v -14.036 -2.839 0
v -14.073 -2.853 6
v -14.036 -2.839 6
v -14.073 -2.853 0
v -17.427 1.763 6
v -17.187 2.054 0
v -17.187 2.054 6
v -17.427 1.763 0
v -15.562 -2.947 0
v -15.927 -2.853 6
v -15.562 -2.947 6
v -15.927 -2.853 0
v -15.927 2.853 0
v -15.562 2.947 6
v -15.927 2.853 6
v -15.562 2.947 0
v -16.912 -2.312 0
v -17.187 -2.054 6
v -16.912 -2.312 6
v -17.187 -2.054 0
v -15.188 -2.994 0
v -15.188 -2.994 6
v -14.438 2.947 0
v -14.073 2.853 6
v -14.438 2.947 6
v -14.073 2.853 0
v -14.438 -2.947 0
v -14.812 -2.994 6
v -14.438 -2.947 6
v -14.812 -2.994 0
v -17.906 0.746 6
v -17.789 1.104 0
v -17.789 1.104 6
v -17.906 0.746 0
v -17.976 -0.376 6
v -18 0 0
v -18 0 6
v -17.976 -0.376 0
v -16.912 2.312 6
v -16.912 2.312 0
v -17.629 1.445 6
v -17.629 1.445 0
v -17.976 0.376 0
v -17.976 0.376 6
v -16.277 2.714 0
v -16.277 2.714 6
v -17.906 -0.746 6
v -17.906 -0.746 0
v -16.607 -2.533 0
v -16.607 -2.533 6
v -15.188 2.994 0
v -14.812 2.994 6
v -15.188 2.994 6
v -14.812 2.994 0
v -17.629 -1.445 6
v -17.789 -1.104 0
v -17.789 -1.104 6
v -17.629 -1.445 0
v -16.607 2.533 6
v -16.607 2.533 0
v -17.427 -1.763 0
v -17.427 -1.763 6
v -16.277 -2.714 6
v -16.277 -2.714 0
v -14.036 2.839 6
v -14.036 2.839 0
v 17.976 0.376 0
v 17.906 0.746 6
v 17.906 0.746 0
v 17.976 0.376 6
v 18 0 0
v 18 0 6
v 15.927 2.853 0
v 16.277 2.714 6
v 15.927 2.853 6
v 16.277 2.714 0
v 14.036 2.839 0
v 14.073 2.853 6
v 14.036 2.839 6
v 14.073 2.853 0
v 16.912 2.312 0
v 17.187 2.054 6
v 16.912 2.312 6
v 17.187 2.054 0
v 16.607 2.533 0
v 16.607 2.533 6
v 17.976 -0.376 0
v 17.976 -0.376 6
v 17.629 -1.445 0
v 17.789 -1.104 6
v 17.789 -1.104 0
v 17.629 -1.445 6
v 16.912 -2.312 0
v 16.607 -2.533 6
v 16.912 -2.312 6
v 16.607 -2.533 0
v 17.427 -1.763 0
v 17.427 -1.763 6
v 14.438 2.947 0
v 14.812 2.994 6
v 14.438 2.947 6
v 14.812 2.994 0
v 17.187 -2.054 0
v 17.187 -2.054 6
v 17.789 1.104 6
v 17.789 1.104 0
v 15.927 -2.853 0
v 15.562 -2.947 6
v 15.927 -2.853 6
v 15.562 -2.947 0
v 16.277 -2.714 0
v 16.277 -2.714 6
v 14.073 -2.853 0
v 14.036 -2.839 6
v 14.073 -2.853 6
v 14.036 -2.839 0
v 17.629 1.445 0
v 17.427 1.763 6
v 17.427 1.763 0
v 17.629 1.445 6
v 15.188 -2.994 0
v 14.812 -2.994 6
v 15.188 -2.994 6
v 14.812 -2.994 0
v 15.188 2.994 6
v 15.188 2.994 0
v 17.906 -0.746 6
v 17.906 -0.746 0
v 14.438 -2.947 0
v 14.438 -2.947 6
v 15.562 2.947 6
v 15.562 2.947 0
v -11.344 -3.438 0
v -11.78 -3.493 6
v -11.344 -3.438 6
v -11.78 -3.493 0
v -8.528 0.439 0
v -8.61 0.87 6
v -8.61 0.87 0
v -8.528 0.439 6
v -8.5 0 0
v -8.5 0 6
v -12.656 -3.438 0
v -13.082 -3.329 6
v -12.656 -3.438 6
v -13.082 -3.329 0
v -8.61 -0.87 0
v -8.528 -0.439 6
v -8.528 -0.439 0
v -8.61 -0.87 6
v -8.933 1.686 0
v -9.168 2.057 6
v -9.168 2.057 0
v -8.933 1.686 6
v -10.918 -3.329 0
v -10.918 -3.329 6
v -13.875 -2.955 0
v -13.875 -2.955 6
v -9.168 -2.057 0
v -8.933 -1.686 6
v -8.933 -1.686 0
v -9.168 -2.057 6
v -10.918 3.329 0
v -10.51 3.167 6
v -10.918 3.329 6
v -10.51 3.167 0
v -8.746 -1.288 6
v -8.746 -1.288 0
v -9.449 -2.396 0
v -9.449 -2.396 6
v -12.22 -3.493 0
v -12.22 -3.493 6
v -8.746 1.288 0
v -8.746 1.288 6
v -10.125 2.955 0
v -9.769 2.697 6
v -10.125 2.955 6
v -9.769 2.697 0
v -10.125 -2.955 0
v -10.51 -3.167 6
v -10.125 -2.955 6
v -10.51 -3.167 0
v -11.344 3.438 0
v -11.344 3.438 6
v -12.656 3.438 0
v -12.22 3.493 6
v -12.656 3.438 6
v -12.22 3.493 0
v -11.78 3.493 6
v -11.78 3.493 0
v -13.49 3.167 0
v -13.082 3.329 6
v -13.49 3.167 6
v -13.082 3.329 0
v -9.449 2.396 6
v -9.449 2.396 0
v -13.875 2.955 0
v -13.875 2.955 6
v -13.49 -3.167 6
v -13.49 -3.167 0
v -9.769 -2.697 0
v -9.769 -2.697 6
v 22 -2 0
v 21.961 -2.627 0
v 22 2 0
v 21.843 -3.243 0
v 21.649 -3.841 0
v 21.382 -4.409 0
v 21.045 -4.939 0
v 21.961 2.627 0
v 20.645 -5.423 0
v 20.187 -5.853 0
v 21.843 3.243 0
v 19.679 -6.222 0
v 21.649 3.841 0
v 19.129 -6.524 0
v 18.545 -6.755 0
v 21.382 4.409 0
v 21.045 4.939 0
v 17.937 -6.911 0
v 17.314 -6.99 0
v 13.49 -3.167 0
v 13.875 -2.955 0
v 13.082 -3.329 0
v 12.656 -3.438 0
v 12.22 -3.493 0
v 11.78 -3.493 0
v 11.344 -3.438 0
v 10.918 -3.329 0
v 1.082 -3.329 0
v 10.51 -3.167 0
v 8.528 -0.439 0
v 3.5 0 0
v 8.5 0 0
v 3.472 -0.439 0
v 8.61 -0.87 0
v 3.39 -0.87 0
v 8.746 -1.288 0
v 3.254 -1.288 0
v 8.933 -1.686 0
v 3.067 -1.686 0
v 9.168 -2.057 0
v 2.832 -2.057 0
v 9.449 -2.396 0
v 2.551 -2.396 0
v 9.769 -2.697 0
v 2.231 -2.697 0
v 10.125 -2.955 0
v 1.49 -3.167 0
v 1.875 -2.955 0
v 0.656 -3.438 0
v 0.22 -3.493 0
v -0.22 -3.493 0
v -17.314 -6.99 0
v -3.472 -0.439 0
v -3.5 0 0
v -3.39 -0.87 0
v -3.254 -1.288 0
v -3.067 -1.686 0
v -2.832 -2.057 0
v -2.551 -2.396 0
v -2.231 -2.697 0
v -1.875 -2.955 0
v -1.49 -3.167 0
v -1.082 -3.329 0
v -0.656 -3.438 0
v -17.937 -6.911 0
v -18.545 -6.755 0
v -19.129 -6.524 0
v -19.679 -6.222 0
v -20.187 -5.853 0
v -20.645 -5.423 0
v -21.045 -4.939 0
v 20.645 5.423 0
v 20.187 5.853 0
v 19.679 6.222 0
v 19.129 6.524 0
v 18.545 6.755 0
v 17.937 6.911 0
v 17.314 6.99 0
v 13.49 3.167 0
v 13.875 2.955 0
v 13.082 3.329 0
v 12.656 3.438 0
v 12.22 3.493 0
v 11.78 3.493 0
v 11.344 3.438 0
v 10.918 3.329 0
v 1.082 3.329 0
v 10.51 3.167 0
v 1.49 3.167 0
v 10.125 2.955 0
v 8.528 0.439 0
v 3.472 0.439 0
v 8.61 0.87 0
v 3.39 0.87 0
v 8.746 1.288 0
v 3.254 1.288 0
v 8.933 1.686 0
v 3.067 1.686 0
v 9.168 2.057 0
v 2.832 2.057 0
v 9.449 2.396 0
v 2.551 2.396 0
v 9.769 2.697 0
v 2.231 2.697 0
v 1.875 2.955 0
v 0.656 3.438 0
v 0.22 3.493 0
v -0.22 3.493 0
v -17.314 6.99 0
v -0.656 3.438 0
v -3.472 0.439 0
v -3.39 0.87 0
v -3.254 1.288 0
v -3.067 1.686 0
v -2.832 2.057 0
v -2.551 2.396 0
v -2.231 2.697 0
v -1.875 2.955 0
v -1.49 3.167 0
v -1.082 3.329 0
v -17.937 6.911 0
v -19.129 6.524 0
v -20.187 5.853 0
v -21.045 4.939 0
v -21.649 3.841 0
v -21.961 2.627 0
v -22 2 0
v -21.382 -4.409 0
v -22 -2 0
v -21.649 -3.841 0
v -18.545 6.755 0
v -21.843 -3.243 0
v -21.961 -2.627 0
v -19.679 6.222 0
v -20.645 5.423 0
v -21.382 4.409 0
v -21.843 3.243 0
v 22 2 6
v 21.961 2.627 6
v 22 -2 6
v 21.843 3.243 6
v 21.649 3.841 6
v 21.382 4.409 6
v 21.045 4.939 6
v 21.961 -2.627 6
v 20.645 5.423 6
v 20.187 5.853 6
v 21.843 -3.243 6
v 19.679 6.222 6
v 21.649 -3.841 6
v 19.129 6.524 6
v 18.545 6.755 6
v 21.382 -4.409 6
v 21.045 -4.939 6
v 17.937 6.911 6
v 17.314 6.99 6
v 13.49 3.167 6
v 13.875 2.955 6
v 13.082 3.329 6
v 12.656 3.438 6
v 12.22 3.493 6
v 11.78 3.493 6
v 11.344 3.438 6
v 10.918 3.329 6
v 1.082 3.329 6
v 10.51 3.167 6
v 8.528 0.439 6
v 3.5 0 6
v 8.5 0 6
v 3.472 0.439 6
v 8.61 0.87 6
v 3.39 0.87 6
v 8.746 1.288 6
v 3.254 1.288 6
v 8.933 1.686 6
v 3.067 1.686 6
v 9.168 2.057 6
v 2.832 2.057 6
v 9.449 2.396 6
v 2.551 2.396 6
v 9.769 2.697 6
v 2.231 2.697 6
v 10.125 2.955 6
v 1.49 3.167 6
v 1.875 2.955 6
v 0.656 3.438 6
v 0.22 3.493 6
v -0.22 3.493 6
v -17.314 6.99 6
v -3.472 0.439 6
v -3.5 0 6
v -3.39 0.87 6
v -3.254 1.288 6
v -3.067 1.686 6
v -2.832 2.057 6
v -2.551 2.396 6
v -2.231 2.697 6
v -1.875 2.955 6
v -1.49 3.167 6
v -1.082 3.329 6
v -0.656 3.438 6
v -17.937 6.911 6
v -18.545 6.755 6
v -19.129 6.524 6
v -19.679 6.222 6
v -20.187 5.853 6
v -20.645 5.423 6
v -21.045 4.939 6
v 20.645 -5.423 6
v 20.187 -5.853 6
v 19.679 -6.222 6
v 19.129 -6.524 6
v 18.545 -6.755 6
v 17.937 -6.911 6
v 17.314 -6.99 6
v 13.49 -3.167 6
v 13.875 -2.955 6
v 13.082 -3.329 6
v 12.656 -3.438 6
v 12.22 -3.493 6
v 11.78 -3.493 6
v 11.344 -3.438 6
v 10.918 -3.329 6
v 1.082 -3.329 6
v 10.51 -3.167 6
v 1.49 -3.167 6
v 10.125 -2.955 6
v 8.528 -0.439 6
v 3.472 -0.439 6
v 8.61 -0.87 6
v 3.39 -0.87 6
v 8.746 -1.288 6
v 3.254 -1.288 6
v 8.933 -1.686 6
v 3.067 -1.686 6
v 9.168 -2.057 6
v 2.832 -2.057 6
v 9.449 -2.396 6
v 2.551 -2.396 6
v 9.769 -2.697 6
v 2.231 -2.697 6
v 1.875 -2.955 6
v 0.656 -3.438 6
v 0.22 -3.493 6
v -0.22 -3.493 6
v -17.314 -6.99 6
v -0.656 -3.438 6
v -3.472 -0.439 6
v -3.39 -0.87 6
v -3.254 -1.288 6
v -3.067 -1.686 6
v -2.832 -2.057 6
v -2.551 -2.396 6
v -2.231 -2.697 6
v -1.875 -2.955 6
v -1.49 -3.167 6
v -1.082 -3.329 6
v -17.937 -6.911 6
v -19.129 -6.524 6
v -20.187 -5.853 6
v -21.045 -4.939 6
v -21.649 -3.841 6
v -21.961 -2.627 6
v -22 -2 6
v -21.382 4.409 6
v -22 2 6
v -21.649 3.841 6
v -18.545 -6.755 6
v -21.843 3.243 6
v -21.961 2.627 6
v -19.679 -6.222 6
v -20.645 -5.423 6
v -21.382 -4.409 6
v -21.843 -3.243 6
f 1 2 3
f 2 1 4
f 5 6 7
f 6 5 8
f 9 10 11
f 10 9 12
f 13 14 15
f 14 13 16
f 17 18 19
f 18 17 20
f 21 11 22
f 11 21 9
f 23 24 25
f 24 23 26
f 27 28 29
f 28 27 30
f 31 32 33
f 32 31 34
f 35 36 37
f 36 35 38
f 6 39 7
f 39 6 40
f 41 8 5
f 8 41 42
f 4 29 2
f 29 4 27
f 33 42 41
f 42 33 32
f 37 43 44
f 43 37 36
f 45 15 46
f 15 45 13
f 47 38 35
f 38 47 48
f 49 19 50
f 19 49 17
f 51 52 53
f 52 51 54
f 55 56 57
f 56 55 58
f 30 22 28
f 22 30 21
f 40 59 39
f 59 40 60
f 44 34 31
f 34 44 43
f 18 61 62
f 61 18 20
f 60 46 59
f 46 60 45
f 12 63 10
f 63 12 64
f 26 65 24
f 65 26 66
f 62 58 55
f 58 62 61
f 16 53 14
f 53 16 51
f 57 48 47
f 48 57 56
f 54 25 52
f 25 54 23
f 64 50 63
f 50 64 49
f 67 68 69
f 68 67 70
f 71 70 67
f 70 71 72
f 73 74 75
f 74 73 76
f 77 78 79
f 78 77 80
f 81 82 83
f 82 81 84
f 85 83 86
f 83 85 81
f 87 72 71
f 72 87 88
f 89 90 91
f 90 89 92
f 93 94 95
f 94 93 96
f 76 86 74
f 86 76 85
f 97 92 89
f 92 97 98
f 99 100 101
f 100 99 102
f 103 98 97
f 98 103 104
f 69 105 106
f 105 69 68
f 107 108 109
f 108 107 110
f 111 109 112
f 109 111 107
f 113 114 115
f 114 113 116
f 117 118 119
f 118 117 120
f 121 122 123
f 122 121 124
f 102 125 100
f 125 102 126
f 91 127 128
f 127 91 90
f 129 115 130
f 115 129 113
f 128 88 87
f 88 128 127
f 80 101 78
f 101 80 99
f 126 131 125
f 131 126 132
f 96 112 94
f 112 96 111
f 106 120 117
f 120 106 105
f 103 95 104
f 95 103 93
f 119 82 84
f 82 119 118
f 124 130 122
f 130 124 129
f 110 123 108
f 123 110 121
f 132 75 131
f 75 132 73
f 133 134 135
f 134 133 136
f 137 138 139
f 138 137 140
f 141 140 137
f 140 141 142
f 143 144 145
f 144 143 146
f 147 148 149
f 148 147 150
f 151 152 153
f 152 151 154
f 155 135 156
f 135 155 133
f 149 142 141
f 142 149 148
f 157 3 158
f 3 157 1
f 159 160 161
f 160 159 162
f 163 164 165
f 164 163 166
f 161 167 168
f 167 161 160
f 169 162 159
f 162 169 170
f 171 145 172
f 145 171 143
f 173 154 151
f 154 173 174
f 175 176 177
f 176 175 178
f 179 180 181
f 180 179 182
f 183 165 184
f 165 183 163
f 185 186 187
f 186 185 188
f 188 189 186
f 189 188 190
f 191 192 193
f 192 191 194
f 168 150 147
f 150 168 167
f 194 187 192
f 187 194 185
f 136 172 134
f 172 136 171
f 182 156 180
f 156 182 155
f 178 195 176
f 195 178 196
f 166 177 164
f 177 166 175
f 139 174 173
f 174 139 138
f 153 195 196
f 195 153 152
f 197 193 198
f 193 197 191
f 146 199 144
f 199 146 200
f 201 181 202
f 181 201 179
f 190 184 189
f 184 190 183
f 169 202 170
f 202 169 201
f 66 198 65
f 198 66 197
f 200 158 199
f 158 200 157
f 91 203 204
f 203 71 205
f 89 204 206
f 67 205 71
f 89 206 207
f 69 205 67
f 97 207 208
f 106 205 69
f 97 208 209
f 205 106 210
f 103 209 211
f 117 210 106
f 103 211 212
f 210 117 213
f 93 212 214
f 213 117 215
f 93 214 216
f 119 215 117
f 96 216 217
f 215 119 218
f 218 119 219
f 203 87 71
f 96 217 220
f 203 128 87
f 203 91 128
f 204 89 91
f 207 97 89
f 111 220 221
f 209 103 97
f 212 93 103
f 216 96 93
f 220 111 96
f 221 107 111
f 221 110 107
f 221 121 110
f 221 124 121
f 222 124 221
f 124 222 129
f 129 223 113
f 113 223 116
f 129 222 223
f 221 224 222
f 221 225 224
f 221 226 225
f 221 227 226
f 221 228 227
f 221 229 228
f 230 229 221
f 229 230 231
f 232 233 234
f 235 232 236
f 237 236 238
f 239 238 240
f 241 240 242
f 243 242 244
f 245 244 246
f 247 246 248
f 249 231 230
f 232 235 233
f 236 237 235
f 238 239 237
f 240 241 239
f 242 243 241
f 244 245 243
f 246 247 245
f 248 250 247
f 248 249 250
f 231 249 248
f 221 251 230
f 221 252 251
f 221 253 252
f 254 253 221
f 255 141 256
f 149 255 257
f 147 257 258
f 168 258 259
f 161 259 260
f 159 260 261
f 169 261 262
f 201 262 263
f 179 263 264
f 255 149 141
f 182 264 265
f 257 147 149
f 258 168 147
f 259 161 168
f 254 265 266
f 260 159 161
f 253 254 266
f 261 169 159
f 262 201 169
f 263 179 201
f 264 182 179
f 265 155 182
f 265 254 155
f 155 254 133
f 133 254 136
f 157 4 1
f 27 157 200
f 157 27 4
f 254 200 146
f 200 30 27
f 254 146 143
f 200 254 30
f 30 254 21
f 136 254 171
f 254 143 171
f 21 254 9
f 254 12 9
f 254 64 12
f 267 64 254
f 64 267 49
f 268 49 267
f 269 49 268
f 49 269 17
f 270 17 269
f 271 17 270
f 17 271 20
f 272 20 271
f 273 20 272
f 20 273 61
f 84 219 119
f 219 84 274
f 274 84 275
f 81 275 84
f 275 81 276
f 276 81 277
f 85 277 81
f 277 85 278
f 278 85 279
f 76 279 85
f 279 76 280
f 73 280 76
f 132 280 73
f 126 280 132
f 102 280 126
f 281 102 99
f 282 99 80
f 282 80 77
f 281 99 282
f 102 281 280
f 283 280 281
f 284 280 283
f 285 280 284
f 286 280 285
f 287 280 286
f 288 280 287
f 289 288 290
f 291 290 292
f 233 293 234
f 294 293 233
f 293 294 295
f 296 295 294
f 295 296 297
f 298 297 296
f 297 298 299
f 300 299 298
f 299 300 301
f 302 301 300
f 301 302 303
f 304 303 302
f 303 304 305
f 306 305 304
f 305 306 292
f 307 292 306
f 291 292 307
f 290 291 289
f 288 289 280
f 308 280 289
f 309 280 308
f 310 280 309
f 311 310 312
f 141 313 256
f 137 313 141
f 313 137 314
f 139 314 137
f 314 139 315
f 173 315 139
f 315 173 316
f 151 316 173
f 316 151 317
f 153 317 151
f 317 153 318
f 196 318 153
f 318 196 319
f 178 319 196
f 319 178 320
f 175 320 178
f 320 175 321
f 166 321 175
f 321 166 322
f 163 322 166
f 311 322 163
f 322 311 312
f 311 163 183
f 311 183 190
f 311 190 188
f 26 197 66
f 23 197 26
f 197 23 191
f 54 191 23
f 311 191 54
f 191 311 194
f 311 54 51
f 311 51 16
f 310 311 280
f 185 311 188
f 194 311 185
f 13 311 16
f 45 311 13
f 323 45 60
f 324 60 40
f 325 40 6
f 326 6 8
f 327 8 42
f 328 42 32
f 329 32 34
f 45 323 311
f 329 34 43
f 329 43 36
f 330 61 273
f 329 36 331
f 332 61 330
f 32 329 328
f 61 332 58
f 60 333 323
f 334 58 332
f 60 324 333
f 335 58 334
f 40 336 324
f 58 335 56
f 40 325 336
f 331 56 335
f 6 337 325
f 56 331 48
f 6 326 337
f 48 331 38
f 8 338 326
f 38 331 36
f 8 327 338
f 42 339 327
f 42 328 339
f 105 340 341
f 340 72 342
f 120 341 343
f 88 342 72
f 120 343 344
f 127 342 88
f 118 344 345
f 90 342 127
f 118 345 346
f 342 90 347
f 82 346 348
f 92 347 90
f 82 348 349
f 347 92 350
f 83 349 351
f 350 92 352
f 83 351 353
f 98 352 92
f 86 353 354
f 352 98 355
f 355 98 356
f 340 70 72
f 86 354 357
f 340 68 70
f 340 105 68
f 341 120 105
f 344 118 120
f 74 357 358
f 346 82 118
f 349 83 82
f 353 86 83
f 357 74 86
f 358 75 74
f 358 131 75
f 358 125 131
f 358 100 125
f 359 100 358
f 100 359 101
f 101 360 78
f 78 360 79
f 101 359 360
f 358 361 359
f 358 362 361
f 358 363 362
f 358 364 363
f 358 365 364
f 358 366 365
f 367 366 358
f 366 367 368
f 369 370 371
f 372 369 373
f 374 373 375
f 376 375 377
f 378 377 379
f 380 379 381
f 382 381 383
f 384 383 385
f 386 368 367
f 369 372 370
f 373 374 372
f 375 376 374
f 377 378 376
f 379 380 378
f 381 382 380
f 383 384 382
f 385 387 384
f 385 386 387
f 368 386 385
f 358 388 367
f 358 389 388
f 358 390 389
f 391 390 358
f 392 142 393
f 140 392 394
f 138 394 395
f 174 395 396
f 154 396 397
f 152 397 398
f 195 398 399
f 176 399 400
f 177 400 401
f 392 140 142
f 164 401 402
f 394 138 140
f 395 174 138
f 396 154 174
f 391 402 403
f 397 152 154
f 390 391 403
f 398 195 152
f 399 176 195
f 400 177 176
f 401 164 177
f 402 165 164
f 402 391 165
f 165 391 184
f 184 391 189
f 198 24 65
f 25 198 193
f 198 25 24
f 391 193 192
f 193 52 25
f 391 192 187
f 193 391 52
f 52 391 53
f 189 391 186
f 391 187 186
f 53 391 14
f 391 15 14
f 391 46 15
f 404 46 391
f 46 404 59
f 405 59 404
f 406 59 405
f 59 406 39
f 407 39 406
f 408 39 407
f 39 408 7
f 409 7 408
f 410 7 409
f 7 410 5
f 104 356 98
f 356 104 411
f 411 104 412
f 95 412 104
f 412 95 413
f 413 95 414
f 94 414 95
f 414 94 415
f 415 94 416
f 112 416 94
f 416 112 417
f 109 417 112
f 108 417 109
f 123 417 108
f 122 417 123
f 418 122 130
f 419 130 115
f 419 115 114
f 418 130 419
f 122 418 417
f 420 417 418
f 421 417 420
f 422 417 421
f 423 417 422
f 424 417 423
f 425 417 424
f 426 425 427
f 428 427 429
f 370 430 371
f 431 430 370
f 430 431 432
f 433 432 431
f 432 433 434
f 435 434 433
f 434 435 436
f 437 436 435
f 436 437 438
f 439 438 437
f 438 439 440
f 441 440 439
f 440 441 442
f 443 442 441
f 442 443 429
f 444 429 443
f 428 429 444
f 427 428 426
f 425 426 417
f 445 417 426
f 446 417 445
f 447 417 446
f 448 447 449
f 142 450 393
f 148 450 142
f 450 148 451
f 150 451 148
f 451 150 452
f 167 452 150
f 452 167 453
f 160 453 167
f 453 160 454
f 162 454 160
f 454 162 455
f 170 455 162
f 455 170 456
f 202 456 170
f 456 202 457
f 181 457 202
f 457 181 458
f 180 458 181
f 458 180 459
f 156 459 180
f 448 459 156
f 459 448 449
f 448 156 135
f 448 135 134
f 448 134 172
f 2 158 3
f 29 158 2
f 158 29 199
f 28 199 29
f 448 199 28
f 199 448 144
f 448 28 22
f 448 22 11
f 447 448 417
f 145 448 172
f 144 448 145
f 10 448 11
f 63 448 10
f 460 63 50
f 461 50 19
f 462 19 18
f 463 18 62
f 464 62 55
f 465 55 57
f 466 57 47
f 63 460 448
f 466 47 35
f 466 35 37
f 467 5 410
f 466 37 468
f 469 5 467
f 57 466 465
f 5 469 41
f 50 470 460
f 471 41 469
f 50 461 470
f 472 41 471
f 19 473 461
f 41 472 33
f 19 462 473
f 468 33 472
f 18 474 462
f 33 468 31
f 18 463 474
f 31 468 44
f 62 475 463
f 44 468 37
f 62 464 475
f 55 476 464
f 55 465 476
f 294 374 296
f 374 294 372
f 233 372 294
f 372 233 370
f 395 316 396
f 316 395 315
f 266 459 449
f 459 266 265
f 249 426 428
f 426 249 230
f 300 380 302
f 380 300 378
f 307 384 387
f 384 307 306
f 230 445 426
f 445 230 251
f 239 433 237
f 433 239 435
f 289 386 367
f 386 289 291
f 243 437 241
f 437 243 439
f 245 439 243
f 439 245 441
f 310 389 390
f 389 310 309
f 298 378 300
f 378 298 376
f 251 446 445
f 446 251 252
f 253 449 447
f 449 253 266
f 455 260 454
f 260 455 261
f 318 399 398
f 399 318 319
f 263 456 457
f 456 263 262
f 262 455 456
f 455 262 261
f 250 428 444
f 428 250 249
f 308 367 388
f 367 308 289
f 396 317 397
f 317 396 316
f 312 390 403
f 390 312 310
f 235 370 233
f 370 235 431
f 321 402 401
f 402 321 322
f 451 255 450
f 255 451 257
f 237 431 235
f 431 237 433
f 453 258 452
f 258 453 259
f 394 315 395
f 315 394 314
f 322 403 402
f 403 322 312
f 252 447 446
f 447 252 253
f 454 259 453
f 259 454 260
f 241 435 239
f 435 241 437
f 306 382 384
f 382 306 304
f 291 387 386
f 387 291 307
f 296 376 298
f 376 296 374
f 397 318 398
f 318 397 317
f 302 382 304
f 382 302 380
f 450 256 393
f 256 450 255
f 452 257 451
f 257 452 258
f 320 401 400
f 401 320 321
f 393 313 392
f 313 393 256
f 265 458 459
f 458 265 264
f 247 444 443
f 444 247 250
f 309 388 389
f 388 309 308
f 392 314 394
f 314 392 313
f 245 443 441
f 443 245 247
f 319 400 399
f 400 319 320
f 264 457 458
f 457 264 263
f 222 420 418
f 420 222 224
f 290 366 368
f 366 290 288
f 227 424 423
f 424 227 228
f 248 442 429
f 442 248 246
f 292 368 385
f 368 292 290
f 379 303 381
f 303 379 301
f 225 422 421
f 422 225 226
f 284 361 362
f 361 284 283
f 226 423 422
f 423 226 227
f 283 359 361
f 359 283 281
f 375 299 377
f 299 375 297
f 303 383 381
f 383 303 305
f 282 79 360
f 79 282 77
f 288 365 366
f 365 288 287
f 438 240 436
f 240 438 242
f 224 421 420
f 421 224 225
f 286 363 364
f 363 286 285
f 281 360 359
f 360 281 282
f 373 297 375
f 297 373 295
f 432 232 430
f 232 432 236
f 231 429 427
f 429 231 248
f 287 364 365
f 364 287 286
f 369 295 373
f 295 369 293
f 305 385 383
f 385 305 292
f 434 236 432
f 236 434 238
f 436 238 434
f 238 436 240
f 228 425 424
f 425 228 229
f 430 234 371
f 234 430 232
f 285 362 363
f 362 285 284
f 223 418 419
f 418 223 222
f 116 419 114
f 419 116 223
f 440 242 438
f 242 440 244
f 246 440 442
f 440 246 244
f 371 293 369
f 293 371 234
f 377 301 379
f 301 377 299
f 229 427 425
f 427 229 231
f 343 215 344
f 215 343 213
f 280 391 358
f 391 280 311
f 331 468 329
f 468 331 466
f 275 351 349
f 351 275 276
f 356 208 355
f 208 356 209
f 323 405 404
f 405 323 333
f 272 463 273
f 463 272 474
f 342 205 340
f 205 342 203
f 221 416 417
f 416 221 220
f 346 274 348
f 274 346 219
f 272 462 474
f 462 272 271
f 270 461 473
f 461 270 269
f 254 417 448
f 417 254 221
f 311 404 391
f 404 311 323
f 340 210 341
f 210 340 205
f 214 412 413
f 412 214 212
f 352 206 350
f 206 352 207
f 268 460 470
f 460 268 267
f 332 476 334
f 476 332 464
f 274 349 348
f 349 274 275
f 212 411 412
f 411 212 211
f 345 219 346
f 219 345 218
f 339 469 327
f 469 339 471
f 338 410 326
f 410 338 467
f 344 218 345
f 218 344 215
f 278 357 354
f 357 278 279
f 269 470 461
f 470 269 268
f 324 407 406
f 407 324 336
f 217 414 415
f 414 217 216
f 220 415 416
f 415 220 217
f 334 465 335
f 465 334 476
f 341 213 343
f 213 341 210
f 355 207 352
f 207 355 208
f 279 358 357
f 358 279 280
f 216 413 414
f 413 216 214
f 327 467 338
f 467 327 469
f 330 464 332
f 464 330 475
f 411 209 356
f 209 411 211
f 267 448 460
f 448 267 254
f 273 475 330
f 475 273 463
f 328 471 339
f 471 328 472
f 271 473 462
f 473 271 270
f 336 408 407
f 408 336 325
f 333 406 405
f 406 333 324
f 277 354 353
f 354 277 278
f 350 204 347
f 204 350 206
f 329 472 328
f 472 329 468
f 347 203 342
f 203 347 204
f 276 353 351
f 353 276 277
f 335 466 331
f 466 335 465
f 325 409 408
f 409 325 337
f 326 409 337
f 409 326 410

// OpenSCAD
$fn = 50;


difference() {
	union() {
		hull() {
			translate(v = [-17.0000000000, 2.0000000000, 0]) {
				cylinder(h = 6, r = 5);
			}
			translate(v = [17.0000000000, 2.0000000000, 0]) {
				cylinder(h = 6, r = 5);
			}
			translate(v = [-17.0000000000, -2.0000000000, 0]) {
				cylinder(h = 6, r = 5);
			}
			translate(v = [17.0000000000, -2.0000000000, 0]) {
				cylinder(h = 6, r = 5);
			}
		}
	}
	union() {
		#translate(v = [-15.0000000000, 0.0000000000, -100.0000000000]) {
			cylinder(h = 200, r = 3.0000000000);
		}
		#translate(v = [-15.0000000000, 0.0000000000, -100.0000000000]) {
			cylinder(h = 200, r = 3.0000000000);
		}
		#translate(v = [15.0000000000, 0.0000000000, -100.0000000000]) {
			cylinder(h = 200, r = 3.0000000000);
		}
		#translate(v = [15.0000000000, 0.0000000000, -100.0000000000]) {
			cylinder(h = 200, r = 3.0000000000);
		}
		#translate(v = [-12.0000000000, 0, 0]) {
			cylinder(h = 6, r = 3.5000000000);
		}
		#cylinder(h = 6, r = 3.5000000000);
		#translate(v = [12.0000000000, 0, 0]) {
			cylinder(h = 6, r = 3.5000000000);
		}
	}
}
